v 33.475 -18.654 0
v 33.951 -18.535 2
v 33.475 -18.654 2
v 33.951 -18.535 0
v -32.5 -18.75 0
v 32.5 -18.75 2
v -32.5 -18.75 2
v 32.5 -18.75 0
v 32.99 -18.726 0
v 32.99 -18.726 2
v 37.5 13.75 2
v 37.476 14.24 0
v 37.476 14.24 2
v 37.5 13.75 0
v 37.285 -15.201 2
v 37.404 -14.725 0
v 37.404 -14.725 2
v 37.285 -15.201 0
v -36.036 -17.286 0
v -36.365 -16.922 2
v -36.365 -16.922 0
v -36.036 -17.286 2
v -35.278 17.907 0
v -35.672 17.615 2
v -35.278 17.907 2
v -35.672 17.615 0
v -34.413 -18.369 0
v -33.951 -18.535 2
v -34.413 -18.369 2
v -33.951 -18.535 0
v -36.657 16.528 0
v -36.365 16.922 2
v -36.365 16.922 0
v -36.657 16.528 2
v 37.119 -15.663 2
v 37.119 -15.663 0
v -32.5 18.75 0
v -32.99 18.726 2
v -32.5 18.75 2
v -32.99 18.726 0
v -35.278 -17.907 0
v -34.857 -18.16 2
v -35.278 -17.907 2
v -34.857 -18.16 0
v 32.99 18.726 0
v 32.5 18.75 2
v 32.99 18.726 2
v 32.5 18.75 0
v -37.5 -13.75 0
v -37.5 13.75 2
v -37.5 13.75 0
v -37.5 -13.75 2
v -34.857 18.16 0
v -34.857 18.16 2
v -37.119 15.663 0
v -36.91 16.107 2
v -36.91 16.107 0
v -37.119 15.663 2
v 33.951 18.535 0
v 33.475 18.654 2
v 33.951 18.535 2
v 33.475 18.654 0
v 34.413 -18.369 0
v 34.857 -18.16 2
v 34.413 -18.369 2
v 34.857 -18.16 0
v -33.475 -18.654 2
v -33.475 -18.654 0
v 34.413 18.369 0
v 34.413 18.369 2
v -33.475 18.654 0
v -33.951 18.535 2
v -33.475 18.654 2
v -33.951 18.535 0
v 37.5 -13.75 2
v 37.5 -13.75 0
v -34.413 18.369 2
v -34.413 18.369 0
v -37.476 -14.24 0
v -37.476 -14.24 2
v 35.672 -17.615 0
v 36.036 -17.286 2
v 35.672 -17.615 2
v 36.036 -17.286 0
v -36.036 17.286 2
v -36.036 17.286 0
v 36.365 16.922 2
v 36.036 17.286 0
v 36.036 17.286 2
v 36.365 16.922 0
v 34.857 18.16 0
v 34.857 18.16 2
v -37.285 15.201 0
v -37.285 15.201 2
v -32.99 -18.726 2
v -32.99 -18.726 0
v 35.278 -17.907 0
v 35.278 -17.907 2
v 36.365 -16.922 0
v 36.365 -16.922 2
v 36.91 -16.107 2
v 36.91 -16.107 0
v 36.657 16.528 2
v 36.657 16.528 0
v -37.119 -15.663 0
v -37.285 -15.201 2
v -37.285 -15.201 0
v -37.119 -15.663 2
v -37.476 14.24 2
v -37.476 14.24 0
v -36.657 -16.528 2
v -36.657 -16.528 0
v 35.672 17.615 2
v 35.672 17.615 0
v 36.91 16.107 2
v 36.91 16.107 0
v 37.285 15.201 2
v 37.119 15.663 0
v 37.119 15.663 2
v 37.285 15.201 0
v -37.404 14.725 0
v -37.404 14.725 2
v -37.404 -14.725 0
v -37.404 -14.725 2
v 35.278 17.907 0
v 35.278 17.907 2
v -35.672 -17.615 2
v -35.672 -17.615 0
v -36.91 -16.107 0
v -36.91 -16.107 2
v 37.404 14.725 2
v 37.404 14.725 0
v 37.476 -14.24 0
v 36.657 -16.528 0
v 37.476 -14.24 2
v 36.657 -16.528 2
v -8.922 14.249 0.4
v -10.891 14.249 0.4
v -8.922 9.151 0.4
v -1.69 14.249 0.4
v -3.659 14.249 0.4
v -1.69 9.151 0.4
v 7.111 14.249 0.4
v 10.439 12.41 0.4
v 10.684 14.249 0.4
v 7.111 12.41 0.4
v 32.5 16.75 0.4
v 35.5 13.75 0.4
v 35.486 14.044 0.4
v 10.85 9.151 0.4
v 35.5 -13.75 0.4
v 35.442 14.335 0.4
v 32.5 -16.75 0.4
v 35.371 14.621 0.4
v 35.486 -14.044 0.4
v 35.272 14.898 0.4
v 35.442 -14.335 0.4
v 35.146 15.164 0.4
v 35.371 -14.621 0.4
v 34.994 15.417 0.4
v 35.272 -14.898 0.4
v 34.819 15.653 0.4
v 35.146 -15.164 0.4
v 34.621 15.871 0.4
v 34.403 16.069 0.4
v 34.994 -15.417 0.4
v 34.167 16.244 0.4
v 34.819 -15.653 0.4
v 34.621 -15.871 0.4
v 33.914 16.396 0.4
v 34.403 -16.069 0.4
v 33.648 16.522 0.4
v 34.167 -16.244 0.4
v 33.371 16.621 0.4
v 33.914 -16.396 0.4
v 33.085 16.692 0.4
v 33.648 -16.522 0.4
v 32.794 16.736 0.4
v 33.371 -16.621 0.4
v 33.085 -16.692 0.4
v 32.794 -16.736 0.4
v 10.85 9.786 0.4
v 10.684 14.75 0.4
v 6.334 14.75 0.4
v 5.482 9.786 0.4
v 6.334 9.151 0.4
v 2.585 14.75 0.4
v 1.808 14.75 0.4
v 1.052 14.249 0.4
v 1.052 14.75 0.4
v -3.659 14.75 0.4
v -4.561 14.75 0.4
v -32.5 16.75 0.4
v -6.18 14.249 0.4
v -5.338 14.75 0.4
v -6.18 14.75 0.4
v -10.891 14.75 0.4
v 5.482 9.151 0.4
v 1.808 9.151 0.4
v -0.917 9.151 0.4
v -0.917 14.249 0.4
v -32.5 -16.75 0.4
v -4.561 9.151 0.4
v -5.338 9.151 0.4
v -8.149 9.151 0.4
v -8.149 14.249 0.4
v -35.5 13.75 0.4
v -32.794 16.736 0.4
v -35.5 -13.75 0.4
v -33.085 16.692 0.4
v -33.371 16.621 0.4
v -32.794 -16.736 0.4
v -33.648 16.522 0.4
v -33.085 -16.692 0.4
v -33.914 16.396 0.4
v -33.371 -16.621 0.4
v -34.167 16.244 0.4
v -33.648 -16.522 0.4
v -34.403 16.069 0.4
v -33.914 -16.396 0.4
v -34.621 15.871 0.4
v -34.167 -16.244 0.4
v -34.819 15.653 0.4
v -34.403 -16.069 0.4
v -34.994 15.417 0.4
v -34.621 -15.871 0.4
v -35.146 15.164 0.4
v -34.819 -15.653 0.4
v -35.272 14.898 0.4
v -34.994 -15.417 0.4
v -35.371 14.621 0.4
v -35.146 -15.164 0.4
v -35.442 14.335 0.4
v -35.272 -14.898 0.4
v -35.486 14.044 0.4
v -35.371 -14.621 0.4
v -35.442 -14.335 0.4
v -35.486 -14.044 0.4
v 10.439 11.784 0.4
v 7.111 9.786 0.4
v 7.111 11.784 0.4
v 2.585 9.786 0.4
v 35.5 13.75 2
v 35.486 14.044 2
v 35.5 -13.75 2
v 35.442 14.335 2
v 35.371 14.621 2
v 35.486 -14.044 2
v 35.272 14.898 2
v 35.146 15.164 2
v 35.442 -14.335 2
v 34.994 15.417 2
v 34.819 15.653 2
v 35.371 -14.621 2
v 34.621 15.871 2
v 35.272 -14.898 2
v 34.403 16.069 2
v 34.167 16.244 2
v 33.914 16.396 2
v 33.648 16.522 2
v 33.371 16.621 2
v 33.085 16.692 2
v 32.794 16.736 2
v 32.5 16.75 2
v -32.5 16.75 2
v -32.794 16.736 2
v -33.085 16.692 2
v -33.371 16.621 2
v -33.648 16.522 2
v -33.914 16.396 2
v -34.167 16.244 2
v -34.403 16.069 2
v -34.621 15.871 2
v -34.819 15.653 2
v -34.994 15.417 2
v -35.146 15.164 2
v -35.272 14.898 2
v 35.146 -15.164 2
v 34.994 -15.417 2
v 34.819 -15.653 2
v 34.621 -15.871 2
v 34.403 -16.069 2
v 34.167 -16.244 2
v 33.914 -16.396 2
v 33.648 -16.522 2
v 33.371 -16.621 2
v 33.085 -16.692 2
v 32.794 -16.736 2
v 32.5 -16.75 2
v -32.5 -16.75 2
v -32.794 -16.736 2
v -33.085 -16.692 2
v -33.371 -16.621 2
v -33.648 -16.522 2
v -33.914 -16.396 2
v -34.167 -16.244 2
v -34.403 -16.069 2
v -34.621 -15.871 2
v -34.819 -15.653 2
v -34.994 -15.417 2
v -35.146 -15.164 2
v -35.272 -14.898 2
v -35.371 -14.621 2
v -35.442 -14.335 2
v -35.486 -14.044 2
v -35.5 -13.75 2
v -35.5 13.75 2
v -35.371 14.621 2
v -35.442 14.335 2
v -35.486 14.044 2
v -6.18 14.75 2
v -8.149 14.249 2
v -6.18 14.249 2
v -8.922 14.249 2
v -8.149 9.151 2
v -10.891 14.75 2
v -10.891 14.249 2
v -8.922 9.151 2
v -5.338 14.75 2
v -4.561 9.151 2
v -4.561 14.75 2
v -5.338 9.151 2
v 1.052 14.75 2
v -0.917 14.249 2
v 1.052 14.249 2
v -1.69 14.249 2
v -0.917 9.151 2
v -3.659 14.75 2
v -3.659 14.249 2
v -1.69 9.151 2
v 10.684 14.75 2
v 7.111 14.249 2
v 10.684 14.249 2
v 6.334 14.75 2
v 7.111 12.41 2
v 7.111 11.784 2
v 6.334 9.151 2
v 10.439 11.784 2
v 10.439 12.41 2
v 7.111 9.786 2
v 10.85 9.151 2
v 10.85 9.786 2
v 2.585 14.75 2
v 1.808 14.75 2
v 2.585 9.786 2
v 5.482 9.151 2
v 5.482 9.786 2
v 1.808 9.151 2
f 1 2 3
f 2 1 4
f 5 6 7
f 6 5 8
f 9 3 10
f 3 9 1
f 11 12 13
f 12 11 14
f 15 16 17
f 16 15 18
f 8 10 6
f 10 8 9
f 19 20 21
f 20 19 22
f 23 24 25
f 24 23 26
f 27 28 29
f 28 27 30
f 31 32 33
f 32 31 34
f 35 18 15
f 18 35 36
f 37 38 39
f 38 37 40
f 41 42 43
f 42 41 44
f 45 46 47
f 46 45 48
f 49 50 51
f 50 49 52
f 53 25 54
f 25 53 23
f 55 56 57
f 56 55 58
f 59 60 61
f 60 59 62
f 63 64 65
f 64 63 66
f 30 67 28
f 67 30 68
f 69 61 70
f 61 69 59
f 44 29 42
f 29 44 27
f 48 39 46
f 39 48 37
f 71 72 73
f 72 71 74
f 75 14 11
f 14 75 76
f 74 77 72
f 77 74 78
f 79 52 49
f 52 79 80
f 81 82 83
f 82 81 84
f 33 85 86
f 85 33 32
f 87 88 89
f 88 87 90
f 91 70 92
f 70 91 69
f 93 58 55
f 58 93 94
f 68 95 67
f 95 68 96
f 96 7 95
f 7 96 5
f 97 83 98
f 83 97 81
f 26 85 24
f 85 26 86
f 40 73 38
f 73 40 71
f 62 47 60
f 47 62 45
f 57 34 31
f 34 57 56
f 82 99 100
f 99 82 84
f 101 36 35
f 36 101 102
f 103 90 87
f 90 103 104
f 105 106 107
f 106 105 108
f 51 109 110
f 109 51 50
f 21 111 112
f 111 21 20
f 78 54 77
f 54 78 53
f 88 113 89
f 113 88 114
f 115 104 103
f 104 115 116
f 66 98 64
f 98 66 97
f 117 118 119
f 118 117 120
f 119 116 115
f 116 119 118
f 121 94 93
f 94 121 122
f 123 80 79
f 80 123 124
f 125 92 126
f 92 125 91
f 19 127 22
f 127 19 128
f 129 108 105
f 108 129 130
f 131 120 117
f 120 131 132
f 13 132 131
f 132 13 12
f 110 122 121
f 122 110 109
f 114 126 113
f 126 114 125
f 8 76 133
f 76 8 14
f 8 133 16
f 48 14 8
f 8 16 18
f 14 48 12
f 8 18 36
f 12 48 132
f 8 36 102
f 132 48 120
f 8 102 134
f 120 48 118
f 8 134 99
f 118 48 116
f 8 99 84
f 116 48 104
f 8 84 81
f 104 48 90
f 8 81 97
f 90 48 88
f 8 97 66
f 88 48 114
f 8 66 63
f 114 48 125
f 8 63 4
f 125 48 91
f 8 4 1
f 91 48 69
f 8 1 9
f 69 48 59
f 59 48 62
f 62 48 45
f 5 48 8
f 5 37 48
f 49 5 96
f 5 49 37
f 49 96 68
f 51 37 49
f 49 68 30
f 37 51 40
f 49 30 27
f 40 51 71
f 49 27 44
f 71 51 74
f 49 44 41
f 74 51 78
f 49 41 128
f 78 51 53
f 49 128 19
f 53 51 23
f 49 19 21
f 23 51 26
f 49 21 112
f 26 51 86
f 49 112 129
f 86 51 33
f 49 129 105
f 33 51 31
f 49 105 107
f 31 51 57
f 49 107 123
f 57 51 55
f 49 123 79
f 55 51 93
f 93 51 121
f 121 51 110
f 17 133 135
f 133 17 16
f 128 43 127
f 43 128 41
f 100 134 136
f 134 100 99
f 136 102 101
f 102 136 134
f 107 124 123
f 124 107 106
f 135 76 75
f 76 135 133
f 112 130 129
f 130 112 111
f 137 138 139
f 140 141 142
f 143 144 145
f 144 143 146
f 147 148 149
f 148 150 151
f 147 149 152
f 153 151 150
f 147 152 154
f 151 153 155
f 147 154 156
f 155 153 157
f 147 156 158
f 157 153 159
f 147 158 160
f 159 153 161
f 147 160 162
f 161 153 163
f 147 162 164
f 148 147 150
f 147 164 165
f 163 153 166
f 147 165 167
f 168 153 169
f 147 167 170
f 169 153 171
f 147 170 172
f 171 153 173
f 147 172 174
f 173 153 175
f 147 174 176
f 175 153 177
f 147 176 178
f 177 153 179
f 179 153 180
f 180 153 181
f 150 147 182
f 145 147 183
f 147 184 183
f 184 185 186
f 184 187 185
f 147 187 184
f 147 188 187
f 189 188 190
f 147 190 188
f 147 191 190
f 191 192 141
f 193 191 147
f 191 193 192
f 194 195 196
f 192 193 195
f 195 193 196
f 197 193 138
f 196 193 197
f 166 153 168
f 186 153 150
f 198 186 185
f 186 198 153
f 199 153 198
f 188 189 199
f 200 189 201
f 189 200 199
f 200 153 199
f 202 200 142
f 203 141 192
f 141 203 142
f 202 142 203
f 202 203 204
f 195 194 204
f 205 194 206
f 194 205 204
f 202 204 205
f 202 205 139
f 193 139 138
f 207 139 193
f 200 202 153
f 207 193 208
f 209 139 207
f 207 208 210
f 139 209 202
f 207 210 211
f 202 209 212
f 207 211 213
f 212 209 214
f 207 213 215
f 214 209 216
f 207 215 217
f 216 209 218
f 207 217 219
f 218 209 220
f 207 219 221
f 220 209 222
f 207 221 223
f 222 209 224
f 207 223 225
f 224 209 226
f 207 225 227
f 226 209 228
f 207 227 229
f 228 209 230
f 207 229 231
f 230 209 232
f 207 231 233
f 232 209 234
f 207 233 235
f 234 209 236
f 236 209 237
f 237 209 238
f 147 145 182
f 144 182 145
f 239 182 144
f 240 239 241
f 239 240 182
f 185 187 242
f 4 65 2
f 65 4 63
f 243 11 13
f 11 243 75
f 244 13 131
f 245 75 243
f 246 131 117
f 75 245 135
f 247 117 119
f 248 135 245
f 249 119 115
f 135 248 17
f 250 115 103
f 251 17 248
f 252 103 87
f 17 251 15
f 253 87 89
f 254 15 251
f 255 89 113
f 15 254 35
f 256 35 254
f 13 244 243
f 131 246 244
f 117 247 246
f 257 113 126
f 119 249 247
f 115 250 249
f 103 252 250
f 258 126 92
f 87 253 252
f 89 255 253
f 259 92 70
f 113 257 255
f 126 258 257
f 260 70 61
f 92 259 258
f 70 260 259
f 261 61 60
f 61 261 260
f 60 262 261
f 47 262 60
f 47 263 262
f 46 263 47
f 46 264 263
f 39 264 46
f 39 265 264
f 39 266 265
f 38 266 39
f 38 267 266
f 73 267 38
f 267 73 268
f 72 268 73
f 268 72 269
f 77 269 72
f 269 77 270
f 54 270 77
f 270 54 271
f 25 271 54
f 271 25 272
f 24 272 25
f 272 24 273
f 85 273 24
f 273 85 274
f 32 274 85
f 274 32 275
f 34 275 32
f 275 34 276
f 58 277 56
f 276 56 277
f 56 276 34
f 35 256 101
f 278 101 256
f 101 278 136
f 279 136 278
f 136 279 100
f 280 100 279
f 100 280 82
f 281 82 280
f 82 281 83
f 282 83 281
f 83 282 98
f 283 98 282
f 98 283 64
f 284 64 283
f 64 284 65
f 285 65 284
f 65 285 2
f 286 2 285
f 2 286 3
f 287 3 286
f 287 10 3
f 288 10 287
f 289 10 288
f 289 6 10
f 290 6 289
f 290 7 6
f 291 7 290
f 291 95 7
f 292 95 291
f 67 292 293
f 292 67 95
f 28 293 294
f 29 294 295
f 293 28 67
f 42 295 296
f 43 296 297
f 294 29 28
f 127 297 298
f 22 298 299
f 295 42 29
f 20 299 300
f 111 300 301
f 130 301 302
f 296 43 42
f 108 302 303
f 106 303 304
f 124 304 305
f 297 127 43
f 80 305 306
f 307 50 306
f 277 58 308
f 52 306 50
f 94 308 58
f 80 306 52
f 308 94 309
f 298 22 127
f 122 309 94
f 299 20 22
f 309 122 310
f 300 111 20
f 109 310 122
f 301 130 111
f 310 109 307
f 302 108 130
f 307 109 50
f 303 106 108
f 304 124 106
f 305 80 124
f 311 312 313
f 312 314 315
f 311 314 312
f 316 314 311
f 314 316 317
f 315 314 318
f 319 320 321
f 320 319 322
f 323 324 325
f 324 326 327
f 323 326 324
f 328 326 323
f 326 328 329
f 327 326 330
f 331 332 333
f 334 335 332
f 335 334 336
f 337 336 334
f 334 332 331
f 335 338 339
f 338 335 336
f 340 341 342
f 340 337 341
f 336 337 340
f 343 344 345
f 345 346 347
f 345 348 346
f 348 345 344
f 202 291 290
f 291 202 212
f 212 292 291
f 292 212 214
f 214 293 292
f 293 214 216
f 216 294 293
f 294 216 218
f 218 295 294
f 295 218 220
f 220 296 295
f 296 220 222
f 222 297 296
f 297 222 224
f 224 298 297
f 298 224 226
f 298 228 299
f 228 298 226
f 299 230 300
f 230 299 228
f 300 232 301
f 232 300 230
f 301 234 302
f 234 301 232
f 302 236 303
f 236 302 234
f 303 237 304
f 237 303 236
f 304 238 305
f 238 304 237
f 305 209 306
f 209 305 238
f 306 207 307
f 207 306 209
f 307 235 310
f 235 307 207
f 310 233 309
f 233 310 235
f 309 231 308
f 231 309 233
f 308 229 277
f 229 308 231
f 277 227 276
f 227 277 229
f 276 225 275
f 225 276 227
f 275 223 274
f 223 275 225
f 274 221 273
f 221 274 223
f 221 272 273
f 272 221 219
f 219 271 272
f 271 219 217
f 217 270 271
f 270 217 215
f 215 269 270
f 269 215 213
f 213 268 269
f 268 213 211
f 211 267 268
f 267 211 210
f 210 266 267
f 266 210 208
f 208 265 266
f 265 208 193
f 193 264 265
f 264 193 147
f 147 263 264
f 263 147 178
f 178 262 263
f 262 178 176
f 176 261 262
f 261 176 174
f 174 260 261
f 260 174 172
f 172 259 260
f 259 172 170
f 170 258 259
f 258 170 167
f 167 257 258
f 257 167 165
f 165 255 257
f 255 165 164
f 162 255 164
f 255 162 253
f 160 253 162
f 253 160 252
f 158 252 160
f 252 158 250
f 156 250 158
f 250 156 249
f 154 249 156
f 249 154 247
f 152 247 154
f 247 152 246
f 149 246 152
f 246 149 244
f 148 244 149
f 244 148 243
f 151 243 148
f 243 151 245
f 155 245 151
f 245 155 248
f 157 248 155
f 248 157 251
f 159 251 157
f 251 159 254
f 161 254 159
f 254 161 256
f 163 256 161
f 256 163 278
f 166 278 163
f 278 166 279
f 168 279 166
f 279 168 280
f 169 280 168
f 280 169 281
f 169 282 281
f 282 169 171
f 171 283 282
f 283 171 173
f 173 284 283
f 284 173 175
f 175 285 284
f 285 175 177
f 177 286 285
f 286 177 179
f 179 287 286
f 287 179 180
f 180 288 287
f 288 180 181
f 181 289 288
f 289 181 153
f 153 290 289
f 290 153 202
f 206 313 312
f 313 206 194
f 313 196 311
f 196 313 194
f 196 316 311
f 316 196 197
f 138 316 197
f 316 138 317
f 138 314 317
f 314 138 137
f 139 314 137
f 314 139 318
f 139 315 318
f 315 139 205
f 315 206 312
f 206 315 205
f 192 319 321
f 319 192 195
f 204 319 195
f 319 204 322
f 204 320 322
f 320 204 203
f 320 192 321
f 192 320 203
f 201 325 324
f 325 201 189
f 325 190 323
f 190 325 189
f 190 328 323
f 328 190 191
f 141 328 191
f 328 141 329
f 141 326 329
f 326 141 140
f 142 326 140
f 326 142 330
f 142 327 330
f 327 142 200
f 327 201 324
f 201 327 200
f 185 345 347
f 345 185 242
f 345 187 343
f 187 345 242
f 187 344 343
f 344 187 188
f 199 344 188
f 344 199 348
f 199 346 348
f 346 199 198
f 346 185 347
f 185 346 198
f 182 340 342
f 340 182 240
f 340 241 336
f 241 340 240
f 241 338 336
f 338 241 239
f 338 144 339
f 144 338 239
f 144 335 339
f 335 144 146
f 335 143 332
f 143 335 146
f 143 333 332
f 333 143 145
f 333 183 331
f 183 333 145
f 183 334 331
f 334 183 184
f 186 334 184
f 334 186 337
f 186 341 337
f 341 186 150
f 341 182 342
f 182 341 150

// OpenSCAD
// file: ../substrate/model.scad
$fn = 64;

// Customizable parameters
width = 75;                 // [25:200] Overall landscape width or portrait height in mm
aspect_ratio = 2;           // [1:0.1:5] Width-to-height ratio
thickness = 2;              // [0.5:0.5:10] Substrate thickness in mm
border_radius = 5;          // [0:0.5:25] Corner radius in mm
orientation = "landscape";  // [landscape, portrait]

function substrate_plate_width(substrate_width, substrate_aspect_ratio, substrate_orientation) =
  substrate_orientation == "portrait"
    ? substrate_width / substrate_aspect_ratio
    : substrate_width;

function substrate_plate_height(substrate_width, substrate_aspect_ratio, substrate_orientation) =
  substrate_orientation == "portrait"
    ? substrate_width
    : substrate_width / substrate_aspect_ratio;

module rounded_rectangle_2d(rect_width, rect_height, radius) {
  bounded_radius = min(radius, min(rect_width, rect_height) / 2);

  if (bounded_radius <= 0) {
    square([rect_width, rect_height], center = true);
  } else {
    offset(r = bounded_radius) {
      square(
        [
          rect_width - (2 * bounded_radius),
          rect_height - (2 * bounded_radius),
        ],
        center = true
      );
    }
  }
}

module substrate(
  substrate_width = width,
  substrate_aspect_ratio = aspect_ratio,
  substrate_thickness = thickness,
  substrate_border_radius = border_radius,
  substrate_orientation = orientation
) {
  linear_extrude(height = substrate_thickness) {
    rounded_rectangle_2d(
      substrate_plate_width(
        substrate_width,
        substrate_aspect_ratio,
        substrate_orientation
      ),
      substrate_plate_height(
        substrate_width,
        substrate_aspect_ratio,
        substrate_orientation
      ),
      substrate_border_radius
    );
  }
}

substrate();
// main file
$fn = 64;

use <../substrate/model.scad>;

// Customizable parameters
width = 75;                    // [25:200] Overall landscape width or portrait height in mm
aspect_ratio = 2;              // [1:0.1:5] Width-to-height ratio
thickness = 2;                 // [0.5:0.5:10] Total placard thickness in mm
backing_thickness = 0.4;       // [0.1:0.1:5] Backing thickness in mm
border_thickness = 2;          // [0:0.5:10] Raised border stroke width in mm
border_radius = 5;             // [0:0.5:25] Corner radius in mm
orientation = "landscape";     // [landscape, portrait]
padding = 2;                   // [0:0.5:20] Space between border and text in mm
gap = 1;                       // [0:0.5:20] Space between title and description in mm
title = "TITLE";               // Required by the YAML build script
title_typeface = "";           // Empty uses OpenSCAD's default font
title_size = 6;                // [1:0.5:30] Title text size in mm
title_alignment = "center";    // [left, center, right]
description = "";              // Optional description text
description_typeface = "";     // Empty uses OpenSCAD's default font
description_size = 6;          // [1:0.5:30] Description text size in mm
description_alignment = "center"; // [left, center, right]
description_lines = [];        // Generated wrapped description lines
description_line_height = 1.25; // [0.5:0.05:3] Description line height multiplier
description_line_spacing = description_size * description_line_height; // Generated from description line height
title_block_height_factor = 1.25; // Descender-safe title layout factor
text_color = "#000000";         // Text and raised border color
substrate_color = "#FFFFFF";    // Substrate color

function text_anchor_x(alignment, plate_width, text_inset) =
  alignment == "left"
    ? (-plate_width / 2) + text_inset
    : alignment == "right"
      ? (plate_width / 2) - text_inset
      : 0;

module raised_border_2d(plate_width, plate_height, radius, border_width) {
  if (border_width > 0) {
    difference() {
      rounded_rectangle_2d(plate_width, plate_height, radius);
      rounded_rectangle_2d(
        plate_width - (2 * border_width),
        plate_height - (2 * border_width),
        max(0, radius - border_width)
      );
    }
  }
}

module placard_text_2d(
  label,
  text_size,
  text_typeface = "",
  text_halign = "center",
  text_valign = "top"
) {
  if (text_typeface == "") {
    text(label, size = text_size, halign = text_halign, valign = text_valign);
  } else {
    text(
      label,
      size = text_size,
      font = text_typeface,
      halign = text_halign,
      valign = text_valign
    );
  }
}

module clipped_title_2d(
  label,
  text_size,
  text_typeface,
  text_alignment,
  text_x,
  text_y,
  clip_width,
  clip_height
) {
  intersection() {
    translate([text_x, text_y]) {
      placard_text_2d(
        label,
        text_size,
        text_typeface,
        text_alignment,
        "top"
      );
    }

    translate([0, text_y - (clip_height / 2)]) {
      square([clip_width, clip_height], center = true);
    }
  }
}

module placard_title_description_features(
  placard_width = width,
  placard_aspect_ratio = aspect_ratio,
  placard_thickness = thickness,
  placard_backing_thickness = backing_thickness,
  placard_border_thickness = border_thickness,
  placard_border_radius = border_radius,
  placard_orientation = orientation,
  placard_padding = padding,
  placard_gap = gap,
  placard_title = title,
  placard_title_typeface = title_typeface,
  placard_title_size = title_size,
  placard_title_block_height_factor = title_block_height_factor,
  placard_title_alignment = title_alignment,
  placard_description = description,
  placard_description_typeface = description_typeface,
  placard_description_size = description_size,
  placard_description_alignment = description_alignment,
  placard_description_lines = description_lines,
  placard_description_line_spacing = description_line_spacing
) {
  plate_width = substrate_plate_width(
    placard_width,
    placard_aspect_ratio,
    placard_orientation
  );
  plate_height = substrate_plate_height(
    placard_width,
    placard_aspect_ratio,
    placard_orientation
  );
  feature_thickness = placard_thickness - placard_backing_thickness;
  feature_overlap = min(0.01, placard_backing_thickness / 2);
  text_inset = placard_border_thickness + placard_padding;
  text_area_width = plate_width - (2 * text_inset);
  text_area_top = (plate_height / 2) - text_inset;
  title_x = text_anchor_x(
    placard_title_alignment,
    plate_width,
    text_inset
  );
  description_x = text_anchor_x(
    placard_description_alignment,
    plate_width,
    text_inset
  );
  title_block_height = placard_title_size * placard_title_block_height_factor;
  description_top = text_area_top - title_block_height - placard_gap;

  translate([0, 0, placard_backing_thickness - feature_overlap]) {
    linear_extrude(height = feature_thickness + feature_overlap) {
      union() {
        raised_border_2d(
          plate_width,
          plate_height,
          placard_border_radius,
          placard_border_thickness
        );

        clipped_title_2d(
          placard_title,
          placard_title_size,
          placard_title_typeface,
          placard_title_alignment,
          title_x,
          text_area_top,
          text_area_width,
          title_block_height
        );

        if (len(placard_description_lines) > 0) {
          for (line_index = [0 : len(placard_description_lines) - 1]) {
            translate(
              [
                description_x,
                description_top -
                  (line_index * placard_description_line_spacing),
              ]
            ) {
              placard_text_2d(
                placard_description_lines[line_index],
                placard_description_size,
                placard_description_typeface,
                placard_description_alignment,
                "top"
              );
            }
          }
        }
      }
    }
  }
}

module placard_title_description_body(
  placard_width = width,
  placard_aspect_ratio = aspect_ratio,
  placard_thickness = thickness,
  placard_backing_thickness = backing_thickness,
  placard_border_thickness = border_thickness,
  placard_border_radius = border_radius,
  placard_orientation = orientation,
  placard_padding = padding,
  placard_gap = gap,
  placard_title = title,
  placard_title_typeface = title_typeface,
  placard_title_size = title_size,
  placard_title_block_height_factor = title_block_height_factor,
  placard_title_alignment = title_alignment,
  placard_description = description,
  placard_description_typeface = description_typeface,
  placard_description_size = description_size,
  placard_description_alignment = description_alignment,
  placard_description_lines = description_lines,
  placard_description_line_spacing = description_line_spacing
) {
  union() {
    substrate(
      substrate_width = placard_width,
      substrate_aspect_ratio = placard_aspect_ratio,
      substrate_thickness = placard_backing_thickness,
      substrate_border_radius = placard_border_radius,
      substrate_orientation = placard_orientation
    );

    placard_title_description_features(
      placard_width = placard_width,
      placard_aspect_ratio = placard_aspect_ratio,
      placard_thickness = placard_thickness,
      placard_backing_thickness = placard_backing_thickness,
      placard_border_thickness = placard_border_thickness,
      placard_border_radius = placard_border_radius,
      placard_orientation = placard_orientation,
      placard_padding = placard_padding,
      placard_gap = placard_gap,
      placard_title = placard_title,
      placard_title_typeface = placard_title_typeface,
      placard_title_size = placard_title_size,
      placard_title_block_height_factor = placard_title_block_height_factor,
      placard_title_alignment = placard_title_alignment,
      placard_description = placard_description,
      placard_description_typeface = placard_description_typeface,
      placard_description_size = placard_description_size,
      placard_description_alignment = placard_description_alignment,
      placard_description_lines = placard_description_lines,
      placard_description_line_spacing = placard_description_line_spacing
    );
  }
}

module placard_substrate_cut(
  placard_width = width,
  placard_aspect_ratio = aspect_ratio,
  placard_thickness = thickness,
  placard_backing_thickness = backing_thickness,
  placard_border_thickness = border_thickness,
  placard_border_radius = border_radius,
  placard_orientation = orientation,
  placard_padding = padding,
  placard_gap = gap,
  placard_title = title,
  placard_title_typeface = title_typeface,
  placard_title_size = title_size,
  placard_title_block_height_factor = title_block_height_factor,
  placard_title_alignment = title_alignment,
  placard_description = description,
  placard_description_typeface = description_typeface,
  placard_description_size = description_size,
  placard_description_alignment = description_alignment,
  placard_description_lines = description_lines,
  placard_description_line_spacing = description_line_spacing,
  placard_substrate_color = substrate_color
) {
  color(placard_substrate_color) {
    difference() {
      substrate(
        substrate_width = placard_width,
        substrate_aspect_ratio = placard_aspect_ratio,
        substrate_thickness = placard_thickness,
        substrate_border_radius = placard_border_radius,
        substrate_orientation = placard_orientation
      );

      placard_title_description_body(
        placard_width = placard_width,
        placard_aspect_ratio = placard_aspect_ratio,
        placard_thickness = placard_thickness,
        placard_backing_thickness = placard_backing_thickness,
        placard_border_thickness = placard_border_thickness,
        placard_border_radius = placard_border_radius,
        placard_orientation = placard_orientation,
        placard_padding = placard_padding,
        placard_gap = placard_gap,
        placard_title = placard_title,
        placard_title_typeface = placard_title_typeface,
        placard_title_size = placard_title_size,
        placard_title_block_height_factor = placard_title_block_height_factor,
        placard_title_alignment = placard_title_alignment,
        placard_description = placard_description,
        placard_description_typeface = placard_description_typeface,
        placard_description_size = placard_description_size,
        placard_description_alignment = placard_description_alignment,
        placard_description_lines = placard_description_lines,
        placard_description_line_spacing = placard_description_line_spacing
      );
    }
  }
}

module placard_title_description(
  placard_width = width,
  placard_aspect_ratio = aspect_ratio,
  placard_thickness = thickness,
  placard_backing_thickness = backing_thickness,
  placard_border_thickness = border_thickness,
  placard_border_radius = border_radius,
  placard_orientation = orientation,
  placard_padding = padding,
  placard_gap = gap,
  placard_title = title,
  placard_title_typeface = title_typeface,
  placard_title_size = title_size,
  placard_title_block_height_factor = title_block_height_factor,
  placard_title_alignment = title_alignment,
  placard_description = description,
  placard_description_typeface = description_typeface,
  placard_description_size = description_size,
  placard_description_alignment = description_alignment,
  placard_description_lines = description_lines,
  placard_description_line_spacing = description_line_spacing,
  placard_text_color = text_color,
  placard_substrate_color = substrate_color
) {
  color(placard_text_color) {
    placard_title_description_body(
      placard_width = placard_width,
      placard_aspect_ratio = placard_aspect_ratio,
      placard_thickness = placard_thickness,
      placard_backing_thickness = placard_backing_thickness,
      placard_border_thickness = placard_border_thickness,
      placard_border_radius = placard_border_radius,
      placard_orientation = placard_orientation,
      placard_padding = placard_padding,
      placard_gap = placard_gap,
      placard_title = placard_title,
      placard_title_typeface = placard_title_typeface,
      placard_title_size = placard_title_size,
      placard_title_block_height_factor = placard_title_block_height_factor,
      placard_title_alignment = placard_title_alignment,
      placard_description = placard_description,
      placard_description_typeface = placard_description_typeface,
      placard_description_size = placard_description_size,
      placard_description_alignment = placard_description_alignment,
      placard_description_lines = placard_description_lines,
      placard_description_line_spacing = placard_description_line_spacing
    );
  }
}

placard_title_description();
